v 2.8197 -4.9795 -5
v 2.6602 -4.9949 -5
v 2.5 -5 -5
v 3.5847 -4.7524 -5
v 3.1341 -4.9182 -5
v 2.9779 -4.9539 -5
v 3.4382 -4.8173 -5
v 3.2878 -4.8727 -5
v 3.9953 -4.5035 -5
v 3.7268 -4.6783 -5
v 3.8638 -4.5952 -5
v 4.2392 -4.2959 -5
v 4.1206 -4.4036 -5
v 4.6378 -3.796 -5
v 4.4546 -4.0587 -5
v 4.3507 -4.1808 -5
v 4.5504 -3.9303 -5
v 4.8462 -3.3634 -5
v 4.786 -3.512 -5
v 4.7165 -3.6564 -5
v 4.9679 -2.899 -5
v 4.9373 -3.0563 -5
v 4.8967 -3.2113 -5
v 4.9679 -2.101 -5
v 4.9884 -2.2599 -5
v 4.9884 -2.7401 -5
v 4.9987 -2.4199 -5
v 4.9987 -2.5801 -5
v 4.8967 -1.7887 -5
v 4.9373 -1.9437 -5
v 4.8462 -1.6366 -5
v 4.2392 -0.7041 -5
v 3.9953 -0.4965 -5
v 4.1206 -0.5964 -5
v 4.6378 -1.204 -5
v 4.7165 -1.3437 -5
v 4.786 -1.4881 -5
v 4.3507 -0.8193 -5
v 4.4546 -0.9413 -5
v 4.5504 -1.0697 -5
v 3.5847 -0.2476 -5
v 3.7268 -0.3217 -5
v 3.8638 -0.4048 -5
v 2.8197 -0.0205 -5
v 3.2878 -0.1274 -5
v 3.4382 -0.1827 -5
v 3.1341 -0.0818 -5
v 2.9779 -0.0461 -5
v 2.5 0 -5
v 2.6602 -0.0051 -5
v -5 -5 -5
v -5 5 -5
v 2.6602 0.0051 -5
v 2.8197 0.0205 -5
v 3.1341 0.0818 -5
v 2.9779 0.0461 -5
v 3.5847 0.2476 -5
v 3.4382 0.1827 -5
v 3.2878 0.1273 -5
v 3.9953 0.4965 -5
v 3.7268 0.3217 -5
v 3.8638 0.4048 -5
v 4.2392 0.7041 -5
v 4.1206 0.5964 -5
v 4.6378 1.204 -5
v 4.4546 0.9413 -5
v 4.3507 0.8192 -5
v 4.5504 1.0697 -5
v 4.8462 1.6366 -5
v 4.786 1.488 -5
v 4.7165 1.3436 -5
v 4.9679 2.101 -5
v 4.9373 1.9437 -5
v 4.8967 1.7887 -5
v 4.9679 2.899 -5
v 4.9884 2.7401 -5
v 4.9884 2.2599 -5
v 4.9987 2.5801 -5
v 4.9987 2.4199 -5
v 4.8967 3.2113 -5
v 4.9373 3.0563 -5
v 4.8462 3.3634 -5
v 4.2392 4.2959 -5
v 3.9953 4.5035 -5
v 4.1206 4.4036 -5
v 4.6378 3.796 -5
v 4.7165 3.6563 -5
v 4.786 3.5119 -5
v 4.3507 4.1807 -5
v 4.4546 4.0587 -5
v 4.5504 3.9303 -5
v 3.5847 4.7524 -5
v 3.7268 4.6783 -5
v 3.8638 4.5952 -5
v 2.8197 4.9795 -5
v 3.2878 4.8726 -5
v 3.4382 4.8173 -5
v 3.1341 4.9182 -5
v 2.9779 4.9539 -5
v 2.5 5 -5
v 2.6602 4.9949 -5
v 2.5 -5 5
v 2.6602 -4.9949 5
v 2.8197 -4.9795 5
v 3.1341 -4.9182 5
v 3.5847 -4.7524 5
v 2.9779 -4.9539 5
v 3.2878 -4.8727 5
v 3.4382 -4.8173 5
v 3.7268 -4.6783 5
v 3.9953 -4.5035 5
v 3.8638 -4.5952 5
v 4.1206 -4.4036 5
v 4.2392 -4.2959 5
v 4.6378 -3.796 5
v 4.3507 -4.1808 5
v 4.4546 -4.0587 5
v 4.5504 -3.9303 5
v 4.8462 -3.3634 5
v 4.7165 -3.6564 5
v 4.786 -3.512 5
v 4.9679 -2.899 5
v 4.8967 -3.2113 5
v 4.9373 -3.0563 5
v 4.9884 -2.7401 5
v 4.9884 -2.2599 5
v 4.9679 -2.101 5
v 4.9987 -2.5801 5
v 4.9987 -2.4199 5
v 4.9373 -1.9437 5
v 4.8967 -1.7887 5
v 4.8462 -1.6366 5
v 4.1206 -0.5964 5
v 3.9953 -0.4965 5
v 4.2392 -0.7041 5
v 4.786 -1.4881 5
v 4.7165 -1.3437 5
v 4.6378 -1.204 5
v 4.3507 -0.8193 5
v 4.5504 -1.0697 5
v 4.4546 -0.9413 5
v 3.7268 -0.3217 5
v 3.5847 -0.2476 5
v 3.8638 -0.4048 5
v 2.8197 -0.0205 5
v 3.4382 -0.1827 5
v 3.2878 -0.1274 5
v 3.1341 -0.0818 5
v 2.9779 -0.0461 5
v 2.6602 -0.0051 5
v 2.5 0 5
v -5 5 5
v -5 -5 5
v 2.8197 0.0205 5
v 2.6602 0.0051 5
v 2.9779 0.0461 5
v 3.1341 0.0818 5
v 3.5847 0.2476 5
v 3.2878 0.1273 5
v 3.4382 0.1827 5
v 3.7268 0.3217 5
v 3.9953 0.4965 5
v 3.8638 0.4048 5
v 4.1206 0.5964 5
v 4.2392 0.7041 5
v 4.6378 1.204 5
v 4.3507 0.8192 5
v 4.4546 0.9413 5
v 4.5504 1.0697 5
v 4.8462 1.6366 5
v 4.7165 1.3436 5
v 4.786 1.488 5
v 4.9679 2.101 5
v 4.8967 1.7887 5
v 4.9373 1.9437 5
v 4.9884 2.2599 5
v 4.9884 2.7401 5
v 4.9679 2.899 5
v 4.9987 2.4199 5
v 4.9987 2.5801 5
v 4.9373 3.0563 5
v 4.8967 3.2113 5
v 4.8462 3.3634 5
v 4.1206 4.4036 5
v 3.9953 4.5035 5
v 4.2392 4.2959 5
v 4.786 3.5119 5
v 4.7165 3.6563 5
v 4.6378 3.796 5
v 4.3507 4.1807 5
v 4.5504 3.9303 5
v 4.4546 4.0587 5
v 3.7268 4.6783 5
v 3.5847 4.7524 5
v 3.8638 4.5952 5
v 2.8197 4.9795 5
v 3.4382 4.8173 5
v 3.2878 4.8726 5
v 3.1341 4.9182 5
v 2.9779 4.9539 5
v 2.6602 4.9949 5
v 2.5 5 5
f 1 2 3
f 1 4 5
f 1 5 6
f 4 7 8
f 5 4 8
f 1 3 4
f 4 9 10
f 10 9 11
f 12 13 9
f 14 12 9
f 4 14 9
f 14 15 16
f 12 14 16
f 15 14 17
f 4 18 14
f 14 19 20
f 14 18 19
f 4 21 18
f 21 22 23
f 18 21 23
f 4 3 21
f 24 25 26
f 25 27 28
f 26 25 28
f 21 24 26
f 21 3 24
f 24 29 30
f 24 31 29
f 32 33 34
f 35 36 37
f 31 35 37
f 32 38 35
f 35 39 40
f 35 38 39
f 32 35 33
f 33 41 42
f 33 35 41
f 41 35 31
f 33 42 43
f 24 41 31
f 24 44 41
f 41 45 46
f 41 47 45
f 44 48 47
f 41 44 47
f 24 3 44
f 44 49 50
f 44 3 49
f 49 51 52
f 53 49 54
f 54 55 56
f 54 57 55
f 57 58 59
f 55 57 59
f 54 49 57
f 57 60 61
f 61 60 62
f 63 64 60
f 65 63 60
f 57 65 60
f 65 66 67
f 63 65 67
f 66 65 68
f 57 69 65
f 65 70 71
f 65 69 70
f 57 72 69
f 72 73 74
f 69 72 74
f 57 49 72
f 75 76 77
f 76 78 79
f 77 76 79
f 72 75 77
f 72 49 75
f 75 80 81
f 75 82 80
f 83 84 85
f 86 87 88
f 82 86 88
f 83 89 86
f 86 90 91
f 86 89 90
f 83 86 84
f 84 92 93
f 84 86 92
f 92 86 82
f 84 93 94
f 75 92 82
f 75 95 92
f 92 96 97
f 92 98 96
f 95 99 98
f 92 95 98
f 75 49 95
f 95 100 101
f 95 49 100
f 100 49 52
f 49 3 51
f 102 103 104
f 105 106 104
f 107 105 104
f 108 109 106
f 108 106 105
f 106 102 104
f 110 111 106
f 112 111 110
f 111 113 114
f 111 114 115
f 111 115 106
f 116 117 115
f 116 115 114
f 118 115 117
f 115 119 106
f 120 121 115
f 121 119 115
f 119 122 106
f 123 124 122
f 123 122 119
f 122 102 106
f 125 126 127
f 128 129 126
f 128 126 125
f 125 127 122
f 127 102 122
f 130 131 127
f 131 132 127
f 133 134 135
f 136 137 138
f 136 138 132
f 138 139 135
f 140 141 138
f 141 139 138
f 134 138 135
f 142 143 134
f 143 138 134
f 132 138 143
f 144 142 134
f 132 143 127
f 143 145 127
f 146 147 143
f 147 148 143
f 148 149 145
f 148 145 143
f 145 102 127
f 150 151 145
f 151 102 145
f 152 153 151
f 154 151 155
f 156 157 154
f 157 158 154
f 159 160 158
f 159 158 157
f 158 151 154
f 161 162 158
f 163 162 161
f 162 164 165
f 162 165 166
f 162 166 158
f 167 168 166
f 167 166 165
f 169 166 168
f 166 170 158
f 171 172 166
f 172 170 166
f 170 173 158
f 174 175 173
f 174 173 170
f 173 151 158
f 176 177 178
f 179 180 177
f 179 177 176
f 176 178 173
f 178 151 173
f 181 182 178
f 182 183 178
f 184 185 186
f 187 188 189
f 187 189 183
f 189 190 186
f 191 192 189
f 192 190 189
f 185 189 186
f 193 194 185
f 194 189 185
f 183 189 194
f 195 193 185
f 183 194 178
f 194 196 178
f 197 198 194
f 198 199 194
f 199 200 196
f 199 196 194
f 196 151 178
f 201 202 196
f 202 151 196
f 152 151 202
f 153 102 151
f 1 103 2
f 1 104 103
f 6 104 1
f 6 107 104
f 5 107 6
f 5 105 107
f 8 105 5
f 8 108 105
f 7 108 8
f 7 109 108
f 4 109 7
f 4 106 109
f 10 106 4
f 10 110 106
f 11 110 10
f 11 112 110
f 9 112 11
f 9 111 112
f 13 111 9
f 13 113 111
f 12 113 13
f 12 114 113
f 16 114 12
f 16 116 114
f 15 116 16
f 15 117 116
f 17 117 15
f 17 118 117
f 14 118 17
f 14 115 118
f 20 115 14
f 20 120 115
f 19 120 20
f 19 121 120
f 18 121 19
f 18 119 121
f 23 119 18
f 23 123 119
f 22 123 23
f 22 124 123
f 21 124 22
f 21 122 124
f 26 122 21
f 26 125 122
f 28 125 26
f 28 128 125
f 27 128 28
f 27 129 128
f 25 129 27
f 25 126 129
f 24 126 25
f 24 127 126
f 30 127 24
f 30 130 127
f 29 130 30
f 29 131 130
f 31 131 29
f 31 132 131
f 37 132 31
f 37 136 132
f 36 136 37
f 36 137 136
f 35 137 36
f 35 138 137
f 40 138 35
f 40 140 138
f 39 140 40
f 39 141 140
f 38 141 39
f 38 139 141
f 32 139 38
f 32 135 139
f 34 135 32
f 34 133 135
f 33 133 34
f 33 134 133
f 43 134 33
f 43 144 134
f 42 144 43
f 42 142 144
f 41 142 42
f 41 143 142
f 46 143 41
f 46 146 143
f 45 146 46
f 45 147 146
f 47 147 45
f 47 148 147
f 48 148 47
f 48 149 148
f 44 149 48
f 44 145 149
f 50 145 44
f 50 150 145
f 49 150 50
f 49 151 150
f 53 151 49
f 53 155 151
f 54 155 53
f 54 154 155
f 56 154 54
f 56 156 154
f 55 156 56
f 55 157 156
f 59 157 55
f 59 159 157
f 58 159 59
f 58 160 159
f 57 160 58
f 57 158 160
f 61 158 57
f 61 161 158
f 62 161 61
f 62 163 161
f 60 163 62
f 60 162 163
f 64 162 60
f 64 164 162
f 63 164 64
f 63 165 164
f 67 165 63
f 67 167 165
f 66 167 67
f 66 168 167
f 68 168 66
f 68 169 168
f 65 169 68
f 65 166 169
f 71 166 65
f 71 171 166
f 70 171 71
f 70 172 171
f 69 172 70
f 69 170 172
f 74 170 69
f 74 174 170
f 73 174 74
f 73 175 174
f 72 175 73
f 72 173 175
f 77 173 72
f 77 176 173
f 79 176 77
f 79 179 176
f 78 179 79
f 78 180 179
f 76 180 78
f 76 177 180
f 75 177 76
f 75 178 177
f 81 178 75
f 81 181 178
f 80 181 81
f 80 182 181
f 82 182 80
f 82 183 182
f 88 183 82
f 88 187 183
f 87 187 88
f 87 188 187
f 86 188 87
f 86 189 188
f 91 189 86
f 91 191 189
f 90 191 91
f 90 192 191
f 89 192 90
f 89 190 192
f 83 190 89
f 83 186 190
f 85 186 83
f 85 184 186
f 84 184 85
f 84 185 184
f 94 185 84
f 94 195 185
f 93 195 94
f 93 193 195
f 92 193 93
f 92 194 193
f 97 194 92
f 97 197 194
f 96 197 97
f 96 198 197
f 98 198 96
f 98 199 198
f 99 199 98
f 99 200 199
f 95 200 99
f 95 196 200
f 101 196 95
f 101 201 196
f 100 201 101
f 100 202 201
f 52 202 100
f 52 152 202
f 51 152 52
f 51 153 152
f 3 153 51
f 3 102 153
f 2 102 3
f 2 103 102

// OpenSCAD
// Generated by SolidPython 1.1.3 on 2025-02-20 04:05:05
$fn=50;


translate(v = [-5.0000000000, -5.0000000000, -5.0000000000]) {
	linear_extrude(height = 10) {
		polygon(points = [[7.5000000000, 10.0000000000], [7.6601755500, 9.9948634819], [7.8196929042, 9.9794750346], [7.9778965718, 9.9538978925], [8.1341364598, 9.9182371576], [8.2877705451, 9.8726393675], [8.4381675122, 9.8172918934], [8.5847093478, 9.7524221698], [8.7267938800, 9.6782967603], [8.8638372530, 9.5952202622], [8.9952763262, 9.5035340547], [9.1205709883, 9.4036148959], [9.2392063765, 9.2958733752], [9.3506949927, 9.1807522257], [9.4545787062, 9.0587245046], [9.5504306365, 8.9302916503], [9.6378569075, 8.7959814208], [9.7164982659, 8.6563457256], [9.7860315575, 8.5119583578], [9.8461710551, 8.3634126361], [9.8966696326, 8.2113189666], [9.9373197805, 8.0563023349], [9.9679544585, 7.8989997376], [9.9884477824, 7.7400575648], [9.9987155405, 7.5801289439], [9.9987155405, 7.4198710561], [9.9884477824, 7.2599424352], [9.9679544585, 7.1010002624], [9.9373197805, 6.9436976651], [9.8966696326, 6.7886810334], [9.8461710551, 6.6365873639], [9.7860315575, 6.4880416422], [9.7164982659, 6.3436542744], [9.6378569075, 6.2040185792], [9.5504306365, 6.0697083497], [9.4545787062, 5.9412754954], [9.3506949927, 5.8192477743], [9.2392063765, 5.7041266248], [9.1205709883, 5.5963851041], [8.9952763262, 5.4964659453], [8.8638372530, 5.4047797378], [8.7267938800, 5.3217032397], [8.5847093478, 5.2475778302], [8.4381675122, 5.1827081066], [8.2877705451, 5.1273606325], [8.1341364598, 5.0817628424], [7.9778965718, 5.0461021075], [7.8196929042, 5.0205249654], [7.6601755500, 5.0051365181], [7.5000000000, 5.0000000000], [7.5000000000, 5.0000000000], [7.6601755500, 4.9948634819], [7.8196929042, 4.9794750346], [7.9778965718, 4.9538978925], [8.1341364598, 4.9182371576], [8.2877705451, 4.8726393675], [8.4381675122, 4.8172918934], [8.5847093478, 4.7524221698], [8.7267938800, 4.6782967603], [8.8638372530, 4.5952202622], [8.9952763262, 4.5035340547], [9.1205709883, 4.4036148959], [9.2392063765, 4.2958733752], [9.3506949927, 4.1807522257], [9.4545787062, 4.0587245046], [9.5504306365, 3.9302916503], [9.6378569075, 3.7959814208], [9.7164982659, 3.6563457256], [9.7860315575, 3.5119583578], [9.8461710551, 3.3634126361], [9.8966696326, 3.2113189666], [9.9373197805, 3.0563023349], [9.9679544585, 2.8989997376], [9.9884477824, 2.7400575648], [9.9987155405, 2.5801289439], [9.9987155405, 2.4198710561], [9.9884477824, 2.2599424352], [9.9679544585, 2.1010002624], [9.9373197805, 1.9436976651], [9.8966696326, 1.7886810334], [9.8461710551, 1.6365873639], [9.7860315575, 1.4880416422], [9.7164982659, 1.3436542744], [9.6378569075, 1.2040185792], [9.5504306365, 1.0697083497], [9.4545787062, 0.9412754954], [9.3506949927, 0.8192477743], [9.2392063765, 0.7041266248], [9.1205709883, 0.5963851041], [8.9952763262, 0.4964659453], [8.8638372530, 0.4047797378], [8.7267938800, 0.3217032397], [8.5847093478, 0.2475778302], [8.4381675122, 0.1827081066], [8.2877705451, 0.1273606325], [8.1341364598, 0.0817628424], [7.9778965718, 0.0461021075], [7.8196929042, 0.0205249654], [7.6601755500, 0.0051365181], [7.5000000000, 0.0000000000], [0, 0], [0, 10]]);
	}
}
/***********************************************
*********      SolidPython code:      **********
************************************************
 
from solid import *
from solid.utils import *

import math
import matplotlib.pyplot as plt
import subprocess
import os

class Hole:
    def __init__(self, x, y, radius):
        """
        Hole defined by:
        :param x: x dimension for center point of the circle as a ratio of letter height
        :param y: y dimension for center point of the circle as a ratio of letter height
        :param radius: radius of circle as a ratio of letter height
        """
        self.x = x
        self.y = y
        self.radius = radius

class Letter3D:
    def __init__(self, name, outer_shape_points, height, holes=None):
        """
        3D Letter defined by:
        :param name: name of letter
        :param outer_shape_points: points defining the outer shape of the letter
        :param heigh: size of cube that letter fits inside
        :param holes: list of Holes
        """
        self.name = name
        self.outer_shape_points = outer_shape_points
        self.holes = holes if holes is None else []
        self.height = height


    def generate(self):
        shape = polygon(points=self.outer_shape_points)

        if self.holes:
            for hole in self.holes:
                circle_hole = circle(r=hole.radius*self.height)
                positioned_hole = translate([hole.x*self.height, hole.y*self.height])(circle_hole)
                shape = difference()(shape, positioned_hole)
        
        shape_3d = linear_extrude(height=self.height)(shape)
        shape_3d = translate([-self.height/2, -self.height/2, -self.height/2])(shape_3d)
        return shape_3d
    
    def render(self):
        scad_render_to_file(self.shape, f"output/{self.name}.scad", file_header='$fn=50;')
        subprocess.run(["C:\\Program Files\\OpenSCAD\\openscad.exe", "-o", f"output\\{self.name}.stl", f"output\\{self.name}.scad"])


class TwoLetter3D:
    def __init__(self, height, letterA, letterA_face, letterB=None, letterB_face=None):
        self.height = height
        self.letterA = letterA
        self.letterB = letterB
        self.letterA_face = letterA_face
        self.letterB_face = letterB_face

    def call_letter_generation(self, letter):
        letter = letter.upper()
        function_name = f"letter_{letter}"
        func = globals().get(function_name)
        if func is None:
            raise ValueError(f"No letter generation function defined for letter '{letter}'.")
        else:
            print(func)
        return func(self.height)
    
    def rotate_object(self, face, shape):
        face = face.lower()
        if face == "z":
            return shape
        if face == "x":
            return rotate(a=90, v=[0,1,0])(shape)
        if face == "y":
            return rotate(a=-90, v=[0,0,1])(shape)
        else:
            raise ValueError("Face must be one of 'x', 'y', or 'z'.")

    def render(self):
        if self.letterA:
            letterA3D = self.call_letter_generation(self.letterA)
            letterA3D = self.rotate_object(self.letterA_face, letterA3D)

        if self.letterB:
            letterB3D = self.call_letter_generation(self.letterB)
            letterB3D = self.rotate_object(self.letterB_face, letterB3D)
            combined = intersection()(letterA3D, letterB3D)
            file_name = self.letterA + self.letterB
            scad_render_to_file(combined, f"output/{file_name}.scad", file_header='$fn=50;')
            subprocess.run(["C:\\Program Files\\OpenSCAD\\openscad.exe", "-o", f"output\\{file_name}.stl", f"output\\{file_name}.scad"])
            return
        else:
            file_name = self.letterA
            scad_render_to_file(letterA3D, f"output/{file_name}.scad", file_header='$fn=50;')
            subprocess.run(["C:\\Program Files\\OpenSCAD\\openscad.exe", "-o", f"output\\{file_name}.stl", f"output\\{file_name}.scad"])
    
                

def arc_points(radius, start_angle, end_angle, center=[0,0], num_points=50):
    angles = [start_angle + i * (end_angle - start_angle) / (num_points - 1)
              for i in range(num_points)]
    points = [
        (center[0] + radius * math.cos(math.radians(angle)),
         center[1] + radius * math.sin(math.radians(angle)))
        for angle in angles
    ]
    return points

def letter_A(h):
    shape_points = [(0,0), (h/2, h), (h, 0), (5/6*h, 0), (2/3*h, 1/3*h), (1/3*h, 1/3*h), (h/6, 0)]
    holes = [Hole(1/2, 7/12, 1/6)]
    A = Letter3D("A", shape_points, h, holes)
    return A.generate()

def letter_B(h):
    top_arc_points = arc_points(h/4, 90, -90, center=[3/4*h, 3/4*h])
    bottom_arc_points = arc_points(h/4, 90, -90, center=[3/4*h, h/4])
    other_points = [(0,0),(0,h)]

    shape_points = top_arc_points + bottom_arc_points + other_points
    holes = [Hole(1/2, 3/4, 1/6), Hole(1/2, 1/4, 1/6)]
    B = Letter3D("B", shape_points, h, holes)
    return B.generate()

def letter_C(h):
    outer_arc_points = arc_points(h/2, 30, 330, center=[h/2,h/2])
    inner_arc_points = arc_points(h/4, 30, 330, center=[h/2,h/2])[::-1]
    shape_points = outer_arc_points + inner_arc_points
    # print(shape_points)
    C = Letter3D("C", shape_points, h)
    return C.generate()


def letter_D(h):
    outer_arc_points = arc_points(h/2, 90, -90, center= [h/2, h/2])
    shape_points = outer_arc_points + [(0,0), (0, h)]
    holes = [Hole(1/2, 1/2, 1/6)]
    D = Letter3D("D", shape_points, h, holes)
    return D.generate()

def letter_E(h):
    points = [(0,0), (h,0), (h,h/5), (h/5,h/5), (h/5,2/5*h), (3/4*h,2/5*h), (3/4*h,3/5*h), (h/5,3/5*h), (h/5,4/5*h), (h,4/5*h), (h,h), (0,h)]
    E = Letter3D("E", points, h)
    return E.generate()

def letter_F(h):
    points = [(0,0), (h/5,0), (h/5,2/5*h), (3/4*h,2/5*h), (3/4*h,3/5*h), (h/5,3/5*h), (h/5,4/5*h), (h,4/5*h), (h,h), (0,h)]
    F = Letter3D("F", points, h)
    return F.generate()

if __name__ == "__main__":
    os.makedirs("output", exist_ok=True)
    
    letters = [chr(x) for x in range(ord('A'), ord('F') + 1)]

    # Generate all combos
    # for letter in letters:
    #     for other_letter in letters:
    #         shape = TwoLetter3D(10, letter, "z", other_letter, "y")
    #         shape.render()

    # Generate all letters
    for letter in letters:
        shape = TwoLetter3D(10, letter, "z")
        shape.render()
 
 
************************************************/
